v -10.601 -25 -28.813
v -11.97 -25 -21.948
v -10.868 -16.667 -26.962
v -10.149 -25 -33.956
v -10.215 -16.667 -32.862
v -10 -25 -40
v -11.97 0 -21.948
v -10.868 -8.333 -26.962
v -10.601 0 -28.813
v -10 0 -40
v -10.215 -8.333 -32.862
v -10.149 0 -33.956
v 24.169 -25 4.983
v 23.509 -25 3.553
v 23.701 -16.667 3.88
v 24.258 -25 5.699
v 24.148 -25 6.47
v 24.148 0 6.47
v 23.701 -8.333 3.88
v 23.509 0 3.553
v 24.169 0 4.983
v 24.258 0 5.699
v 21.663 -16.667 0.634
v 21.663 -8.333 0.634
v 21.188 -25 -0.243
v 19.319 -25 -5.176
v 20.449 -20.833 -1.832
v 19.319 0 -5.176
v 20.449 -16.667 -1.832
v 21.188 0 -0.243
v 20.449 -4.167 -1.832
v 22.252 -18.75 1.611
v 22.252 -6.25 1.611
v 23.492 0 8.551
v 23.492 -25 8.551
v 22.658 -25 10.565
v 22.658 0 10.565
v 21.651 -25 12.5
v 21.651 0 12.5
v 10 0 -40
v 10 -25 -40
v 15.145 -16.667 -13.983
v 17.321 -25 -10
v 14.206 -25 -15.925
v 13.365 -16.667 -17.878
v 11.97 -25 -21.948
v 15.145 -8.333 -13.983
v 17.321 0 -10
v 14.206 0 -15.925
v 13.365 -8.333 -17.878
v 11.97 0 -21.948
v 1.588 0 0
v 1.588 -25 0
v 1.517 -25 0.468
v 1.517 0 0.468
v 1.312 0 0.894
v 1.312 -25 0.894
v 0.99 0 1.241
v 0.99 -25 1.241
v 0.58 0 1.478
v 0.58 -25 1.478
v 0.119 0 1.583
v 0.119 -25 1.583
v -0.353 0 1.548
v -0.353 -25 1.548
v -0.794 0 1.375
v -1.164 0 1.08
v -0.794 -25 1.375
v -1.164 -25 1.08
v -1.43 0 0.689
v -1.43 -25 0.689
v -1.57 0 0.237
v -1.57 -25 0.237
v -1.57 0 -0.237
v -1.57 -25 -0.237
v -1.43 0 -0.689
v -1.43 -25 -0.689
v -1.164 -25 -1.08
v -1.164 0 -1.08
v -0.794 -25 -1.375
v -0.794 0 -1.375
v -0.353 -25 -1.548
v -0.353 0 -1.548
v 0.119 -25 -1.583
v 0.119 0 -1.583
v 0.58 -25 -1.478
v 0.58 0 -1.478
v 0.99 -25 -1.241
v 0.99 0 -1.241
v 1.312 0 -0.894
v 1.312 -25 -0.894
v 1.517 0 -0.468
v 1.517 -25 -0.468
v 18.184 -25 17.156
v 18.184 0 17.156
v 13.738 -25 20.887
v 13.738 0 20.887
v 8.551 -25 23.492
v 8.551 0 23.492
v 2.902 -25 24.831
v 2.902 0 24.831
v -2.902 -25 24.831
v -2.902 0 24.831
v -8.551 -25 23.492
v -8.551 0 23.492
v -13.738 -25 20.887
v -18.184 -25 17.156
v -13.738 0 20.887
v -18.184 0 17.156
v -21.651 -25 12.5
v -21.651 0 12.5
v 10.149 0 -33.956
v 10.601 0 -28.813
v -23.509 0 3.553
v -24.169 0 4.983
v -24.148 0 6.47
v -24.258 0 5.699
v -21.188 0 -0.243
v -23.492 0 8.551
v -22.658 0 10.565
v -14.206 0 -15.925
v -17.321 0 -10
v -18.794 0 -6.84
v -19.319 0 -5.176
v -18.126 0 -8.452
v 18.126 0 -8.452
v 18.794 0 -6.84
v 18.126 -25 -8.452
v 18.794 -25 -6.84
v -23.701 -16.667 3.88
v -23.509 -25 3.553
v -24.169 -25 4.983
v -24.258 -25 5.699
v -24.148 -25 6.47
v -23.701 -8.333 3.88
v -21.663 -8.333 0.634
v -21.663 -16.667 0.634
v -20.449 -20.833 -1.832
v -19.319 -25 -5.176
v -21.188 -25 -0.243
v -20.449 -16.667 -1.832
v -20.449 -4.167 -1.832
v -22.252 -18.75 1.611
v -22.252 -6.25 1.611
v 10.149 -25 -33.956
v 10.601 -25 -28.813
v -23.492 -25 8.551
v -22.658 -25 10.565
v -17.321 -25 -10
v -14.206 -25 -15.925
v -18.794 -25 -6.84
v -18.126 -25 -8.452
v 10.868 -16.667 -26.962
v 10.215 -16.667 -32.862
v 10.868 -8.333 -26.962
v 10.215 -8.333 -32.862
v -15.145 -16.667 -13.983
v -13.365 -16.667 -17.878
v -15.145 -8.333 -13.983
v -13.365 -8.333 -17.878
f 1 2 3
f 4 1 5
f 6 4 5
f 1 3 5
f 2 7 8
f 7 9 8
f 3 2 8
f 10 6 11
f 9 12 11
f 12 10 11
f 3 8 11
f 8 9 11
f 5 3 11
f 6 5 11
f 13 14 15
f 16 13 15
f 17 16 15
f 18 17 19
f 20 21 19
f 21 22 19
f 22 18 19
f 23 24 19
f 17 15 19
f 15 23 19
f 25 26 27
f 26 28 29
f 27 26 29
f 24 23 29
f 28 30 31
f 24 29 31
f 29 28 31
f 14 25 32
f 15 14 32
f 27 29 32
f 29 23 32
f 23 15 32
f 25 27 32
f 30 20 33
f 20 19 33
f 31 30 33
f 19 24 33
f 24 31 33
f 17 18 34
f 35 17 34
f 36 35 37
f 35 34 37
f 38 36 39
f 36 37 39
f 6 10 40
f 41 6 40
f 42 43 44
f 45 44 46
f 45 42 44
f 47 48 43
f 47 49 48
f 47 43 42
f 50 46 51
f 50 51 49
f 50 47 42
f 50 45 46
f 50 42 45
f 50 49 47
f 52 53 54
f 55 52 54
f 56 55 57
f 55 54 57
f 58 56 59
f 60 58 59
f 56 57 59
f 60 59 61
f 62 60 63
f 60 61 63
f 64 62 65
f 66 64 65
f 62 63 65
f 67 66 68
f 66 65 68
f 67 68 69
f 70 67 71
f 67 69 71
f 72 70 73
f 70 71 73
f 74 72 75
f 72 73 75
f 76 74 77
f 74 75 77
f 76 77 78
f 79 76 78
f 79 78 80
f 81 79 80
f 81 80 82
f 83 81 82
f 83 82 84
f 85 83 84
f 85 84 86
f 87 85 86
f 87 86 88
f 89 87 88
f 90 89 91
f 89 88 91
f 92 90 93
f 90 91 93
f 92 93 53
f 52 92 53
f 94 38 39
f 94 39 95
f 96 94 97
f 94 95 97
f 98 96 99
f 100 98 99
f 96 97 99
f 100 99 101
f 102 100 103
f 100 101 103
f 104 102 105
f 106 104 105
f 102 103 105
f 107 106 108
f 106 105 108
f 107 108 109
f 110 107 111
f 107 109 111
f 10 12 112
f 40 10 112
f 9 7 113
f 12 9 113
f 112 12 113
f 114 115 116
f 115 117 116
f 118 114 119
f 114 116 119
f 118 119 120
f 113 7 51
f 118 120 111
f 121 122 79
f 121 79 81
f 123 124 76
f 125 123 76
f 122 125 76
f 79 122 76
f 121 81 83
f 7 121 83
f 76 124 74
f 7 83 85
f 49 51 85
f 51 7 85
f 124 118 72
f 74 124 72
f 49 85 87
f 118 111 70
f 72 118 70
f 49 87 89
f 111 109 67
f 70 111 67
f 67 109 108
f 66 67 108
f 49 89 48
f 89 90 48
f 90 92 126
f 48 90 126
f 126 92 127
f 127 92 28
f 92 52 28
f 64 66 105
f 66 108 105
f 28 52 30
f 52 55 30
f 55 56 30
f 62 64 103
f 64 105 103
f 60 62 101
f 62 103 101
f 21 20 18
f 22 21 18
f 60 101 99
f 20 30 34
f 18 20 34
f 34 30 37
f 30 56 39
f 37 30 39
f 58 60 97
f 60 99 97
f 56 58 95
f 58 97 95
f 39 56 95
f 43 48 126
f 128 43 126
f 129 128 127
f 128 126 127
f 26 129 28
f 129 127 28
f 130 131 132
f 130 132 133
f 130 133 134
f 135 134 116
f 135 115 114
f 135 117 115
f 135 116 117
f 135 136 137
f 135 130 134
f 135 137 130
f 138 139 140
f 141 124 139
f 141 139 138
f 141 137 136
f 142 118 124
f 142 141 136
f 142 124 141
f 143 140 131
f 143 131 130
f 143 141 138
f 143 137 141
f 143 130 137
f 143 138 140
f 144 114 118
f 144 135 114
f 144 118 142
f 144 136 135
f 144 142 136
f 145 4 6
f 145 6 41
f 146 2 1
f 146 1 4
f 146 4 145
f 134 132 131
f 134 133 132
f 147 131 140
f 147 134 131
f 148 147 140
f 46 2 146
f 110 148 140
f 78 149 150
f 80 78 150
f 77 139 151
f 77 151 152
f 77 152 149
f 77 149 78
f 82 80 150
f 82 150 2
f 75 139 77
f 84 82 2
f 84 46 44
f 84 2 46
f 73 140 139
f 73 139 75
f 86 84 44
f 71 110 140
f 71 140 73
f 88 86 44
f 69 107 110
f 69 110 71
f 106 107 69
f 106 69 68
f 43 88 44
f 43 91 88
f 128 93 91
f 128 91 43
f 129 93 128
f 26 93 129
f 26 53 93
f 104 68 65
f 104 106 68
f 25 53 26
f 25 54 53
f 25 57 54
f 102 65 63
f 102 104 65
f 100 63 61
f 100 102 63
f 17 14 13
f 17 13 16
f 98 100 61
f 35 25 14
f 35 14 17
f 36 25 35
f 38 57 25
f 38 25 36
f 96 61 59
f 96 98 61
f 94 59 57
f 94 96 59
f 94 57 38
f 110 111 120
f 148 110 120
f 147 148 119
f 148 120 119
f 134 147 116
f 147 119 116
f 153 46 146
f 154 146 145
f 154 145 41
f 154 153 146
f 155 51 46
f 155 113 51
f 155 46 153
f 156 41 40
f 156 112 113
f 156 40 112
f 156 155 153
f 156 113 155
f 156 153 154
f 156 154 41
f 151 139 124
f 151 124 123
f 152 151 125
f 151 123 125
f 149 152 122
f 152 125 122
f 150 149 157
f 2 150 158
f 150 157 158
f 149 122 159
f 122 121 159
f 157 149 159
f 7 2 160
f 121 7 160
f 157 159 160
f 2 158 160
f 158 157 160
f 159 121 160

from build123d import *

# Parameters (mm, degrees)
F1_DEPTH = 25
F2_R     = 1.5875
F3_DEPTH = 25


with BuildPart() as f1:
    # F0 (on Front) → F1 (new body)
    with BuildSketch(Plane.XZ):
        with BuildLine():
            Line((-17.3205080757, 10), (0, 0))
            Line((0, 0), (17.3205080757, 10))
            ThreePointArc((17.3205080757, 10), (0, 20), (-17.3205080757, 10))
        make_face()
        with BuildLine():
            ThreePointArc((21.6506350946, 12.5), (0, 25), (-21.6506350946, 12.5))
            Line((-21.6506350946, 12.5), (-17.3205080757, 10))
            ThreePointArc((-17.3205080757, 10), (0, 20), (17.3205080757, 10))
            Line((17.3205080757, 10), (21.6506350946, 12.5))
        make_face()
        with BuildLine():
            Line((19.3185165258, 5.1763809021), (24.1481456572, 6.4704761276))
            ThreePointArc((24.1481456572, 6.4704761276), (23.0969883128, 9.5670858091), (21.6506350946, 12.5))
            Line((21.6506350946, 12.5), (17.3205080757, 10))
            ThreePointArc((17.3205080757, 10), (18.4775906502, 7.6536686473), (19.3185165258, 5.1763809021))
        make_face()
        with BuildLine():
            Line((17.3205080757, 10), (0, 0))
            Line((0, 0), (19.3185165258, 5.1763809021))
            ThreePointArc((19.3185165258, 5.1763809021), (18.4775906502, 7.6536686473), (17.3205080757, 10))
        make_face()
        with BuildLine():
            Line((0, 0), (19.3185165258, -5.1763809021))
            ThreePointArc((19.3185165258, -5.1763809021), (19.8288972275, -2.6105238444), (20, 0))
            ThreePointArc((20, 0), (19.8288972275, 2.6105238444), (19.3185165258, 5.1763809021))
            Line((19.3185165258, 5.1763809021), (0, 0))
        make_face()
        with BuildLine():
            add(Edge.make_bspline(
                [(19.3185165258, -5.1763809021), (21.3890688866, 2.5510257083), (24.9246027925, 3.5726986487), (24.1481456572, 6.4704761276)],
                knots=[0, 0, 0, 0, 12.6085128471, 12.6085128471, 12.6085128471, 12.6085128471], degree=3))
            Line((24.1481456572, 6.4704761276), (19.3185165258, 5.1763809021))
            ThreePointArc((19.3185165258, 5.1763809021), (19.8288972275, 2.6105238444), (20, 0))
            ThreePointArc((20, 0), (19.8288972275, -2.6105238444), (19.3185165258, -5.1763809021))
        make_face()
        with BuildLine():
            Line((0, 0), (17.3205080757, -10))
            ThreePointArc((17.3205080757, -10), (18.4775906502, -7.6536686473), (19.3185165258, -5.1763809021))
            Line((19.3185165258, -5.1763809021), (0, 0))
        make_face()
        with BuildLine():
            ThreePointArc((-17.3205080757, -10), (0, -20), (17.3205080757, -10))
            Line((17.3205080757, -10), (0, 0))
            Line((0, 0), (-17.3205080757, 10))
            ThreePointArc((-17.3205080757, 10), (-19.8288972275, 2.6105238444), (-19.3185165258, -5.1763809021))
            ThreePointArc((-19.3185165258, -5.1763809021), (-18.4775906502, -7.6536686473), (-17.3205080757, -10))
        make_face()
        with BuildLine():
            Line((-10, -40), (10, -40))
            add(Edge.make_bspline(
                [(11.9704769274, -21.9478400334), (10.6395133933, -26.6376402025), (10, -32.1254718634), (10, -40)],
                knots=[14.6690901551, 14.6690901551, 14.6690901551, 14.6690901551, 30.8802499745, 30.8802499745, 30.8802499745, 30.8802499745], degree=3))
            ThreePointArc((11.9704769274, -21.9478400334), (0, -25), (-11.9704769274, -21.9478400334))
            add(Edge.make_bspline(
                [(-11.9704769274, -21.9478400334), (-10.6395133933, -26.6376402025), (-10, -32.1254718634), (-10, -40)],
                knots=[14.6690901551, 14.6690901551, 14.6690901551, 14.6690901551, 30.8802499745, 30.8802499745, 30.8802499745, 30.8802499745], degree=3))
        make_face()
        with BuildLine():
            ThreePointArc((-11.9704769274, -21.9478400334), (0, -25), (11.9704769274, -21.9478400334))
            add(Edge.make_bspline(
                [(17.3205080757, -10), (14.9453507879, -14.1138930984), (13.1748339439, -17.7041522123), (11.9704769274, -21.9478400334)],
                knots=[0, 0, 0, 0, 14.6690901551, 14.6690901551, 14.6690901551, 14.6690901551], degree=3))
            ThreePointArc((17.3205080757, -10), (0, -20), (-17.3205080757, -10))
            add(Edge.make_bspline(
                [(-17.3205080757, -10), (-14.9453507879, -14.1138930984), (-13.1748339439, -17.7041522123), (-11.9704769274, -21.9478400334)],
                knots=[0, 0, 0, 0, 14.6690901551, 14.6690901551, 14.6690901551, 14.6690901551], degree=3))
        make_face()
        with BuildLine():
            ThreePointArc((-21.6506350946, 12.5), (-23.0969883128, 9.5670858091), (-24.1481456572, 6.4704761276))
            add(Edge.make_bspline(
                [(-19.3185165258, -5.1763809021), (-21.3890688866, 2.5510257083), (-24.9246027925, 3.5726986487), (-24.1481456572, 6.4704761276)],
                knots=[0, 0, 0, 0, 12.6085128471, 12.6085128471, 12.6085128471, 12.6085128471], degree=3))
            ThreePointArc((-19.3185165258, -5.1763809021), (-19.8288972275, 2.6105238444), (-17.3205080757, 10))
            Line((-17.3205080757, 10), (-21.6506350946, 12.5))
        make_face()
    extrude(amount=F1_DEPTH)

    # F2 (on face) → F3 (cut)
    with BuildSketch(Plane.XZ.offset(25)):
        Circle(F2_R)
    extrude(amount=-F3_DEPTH, mode=Mode.SUBTRACT)


solid = f1.part
